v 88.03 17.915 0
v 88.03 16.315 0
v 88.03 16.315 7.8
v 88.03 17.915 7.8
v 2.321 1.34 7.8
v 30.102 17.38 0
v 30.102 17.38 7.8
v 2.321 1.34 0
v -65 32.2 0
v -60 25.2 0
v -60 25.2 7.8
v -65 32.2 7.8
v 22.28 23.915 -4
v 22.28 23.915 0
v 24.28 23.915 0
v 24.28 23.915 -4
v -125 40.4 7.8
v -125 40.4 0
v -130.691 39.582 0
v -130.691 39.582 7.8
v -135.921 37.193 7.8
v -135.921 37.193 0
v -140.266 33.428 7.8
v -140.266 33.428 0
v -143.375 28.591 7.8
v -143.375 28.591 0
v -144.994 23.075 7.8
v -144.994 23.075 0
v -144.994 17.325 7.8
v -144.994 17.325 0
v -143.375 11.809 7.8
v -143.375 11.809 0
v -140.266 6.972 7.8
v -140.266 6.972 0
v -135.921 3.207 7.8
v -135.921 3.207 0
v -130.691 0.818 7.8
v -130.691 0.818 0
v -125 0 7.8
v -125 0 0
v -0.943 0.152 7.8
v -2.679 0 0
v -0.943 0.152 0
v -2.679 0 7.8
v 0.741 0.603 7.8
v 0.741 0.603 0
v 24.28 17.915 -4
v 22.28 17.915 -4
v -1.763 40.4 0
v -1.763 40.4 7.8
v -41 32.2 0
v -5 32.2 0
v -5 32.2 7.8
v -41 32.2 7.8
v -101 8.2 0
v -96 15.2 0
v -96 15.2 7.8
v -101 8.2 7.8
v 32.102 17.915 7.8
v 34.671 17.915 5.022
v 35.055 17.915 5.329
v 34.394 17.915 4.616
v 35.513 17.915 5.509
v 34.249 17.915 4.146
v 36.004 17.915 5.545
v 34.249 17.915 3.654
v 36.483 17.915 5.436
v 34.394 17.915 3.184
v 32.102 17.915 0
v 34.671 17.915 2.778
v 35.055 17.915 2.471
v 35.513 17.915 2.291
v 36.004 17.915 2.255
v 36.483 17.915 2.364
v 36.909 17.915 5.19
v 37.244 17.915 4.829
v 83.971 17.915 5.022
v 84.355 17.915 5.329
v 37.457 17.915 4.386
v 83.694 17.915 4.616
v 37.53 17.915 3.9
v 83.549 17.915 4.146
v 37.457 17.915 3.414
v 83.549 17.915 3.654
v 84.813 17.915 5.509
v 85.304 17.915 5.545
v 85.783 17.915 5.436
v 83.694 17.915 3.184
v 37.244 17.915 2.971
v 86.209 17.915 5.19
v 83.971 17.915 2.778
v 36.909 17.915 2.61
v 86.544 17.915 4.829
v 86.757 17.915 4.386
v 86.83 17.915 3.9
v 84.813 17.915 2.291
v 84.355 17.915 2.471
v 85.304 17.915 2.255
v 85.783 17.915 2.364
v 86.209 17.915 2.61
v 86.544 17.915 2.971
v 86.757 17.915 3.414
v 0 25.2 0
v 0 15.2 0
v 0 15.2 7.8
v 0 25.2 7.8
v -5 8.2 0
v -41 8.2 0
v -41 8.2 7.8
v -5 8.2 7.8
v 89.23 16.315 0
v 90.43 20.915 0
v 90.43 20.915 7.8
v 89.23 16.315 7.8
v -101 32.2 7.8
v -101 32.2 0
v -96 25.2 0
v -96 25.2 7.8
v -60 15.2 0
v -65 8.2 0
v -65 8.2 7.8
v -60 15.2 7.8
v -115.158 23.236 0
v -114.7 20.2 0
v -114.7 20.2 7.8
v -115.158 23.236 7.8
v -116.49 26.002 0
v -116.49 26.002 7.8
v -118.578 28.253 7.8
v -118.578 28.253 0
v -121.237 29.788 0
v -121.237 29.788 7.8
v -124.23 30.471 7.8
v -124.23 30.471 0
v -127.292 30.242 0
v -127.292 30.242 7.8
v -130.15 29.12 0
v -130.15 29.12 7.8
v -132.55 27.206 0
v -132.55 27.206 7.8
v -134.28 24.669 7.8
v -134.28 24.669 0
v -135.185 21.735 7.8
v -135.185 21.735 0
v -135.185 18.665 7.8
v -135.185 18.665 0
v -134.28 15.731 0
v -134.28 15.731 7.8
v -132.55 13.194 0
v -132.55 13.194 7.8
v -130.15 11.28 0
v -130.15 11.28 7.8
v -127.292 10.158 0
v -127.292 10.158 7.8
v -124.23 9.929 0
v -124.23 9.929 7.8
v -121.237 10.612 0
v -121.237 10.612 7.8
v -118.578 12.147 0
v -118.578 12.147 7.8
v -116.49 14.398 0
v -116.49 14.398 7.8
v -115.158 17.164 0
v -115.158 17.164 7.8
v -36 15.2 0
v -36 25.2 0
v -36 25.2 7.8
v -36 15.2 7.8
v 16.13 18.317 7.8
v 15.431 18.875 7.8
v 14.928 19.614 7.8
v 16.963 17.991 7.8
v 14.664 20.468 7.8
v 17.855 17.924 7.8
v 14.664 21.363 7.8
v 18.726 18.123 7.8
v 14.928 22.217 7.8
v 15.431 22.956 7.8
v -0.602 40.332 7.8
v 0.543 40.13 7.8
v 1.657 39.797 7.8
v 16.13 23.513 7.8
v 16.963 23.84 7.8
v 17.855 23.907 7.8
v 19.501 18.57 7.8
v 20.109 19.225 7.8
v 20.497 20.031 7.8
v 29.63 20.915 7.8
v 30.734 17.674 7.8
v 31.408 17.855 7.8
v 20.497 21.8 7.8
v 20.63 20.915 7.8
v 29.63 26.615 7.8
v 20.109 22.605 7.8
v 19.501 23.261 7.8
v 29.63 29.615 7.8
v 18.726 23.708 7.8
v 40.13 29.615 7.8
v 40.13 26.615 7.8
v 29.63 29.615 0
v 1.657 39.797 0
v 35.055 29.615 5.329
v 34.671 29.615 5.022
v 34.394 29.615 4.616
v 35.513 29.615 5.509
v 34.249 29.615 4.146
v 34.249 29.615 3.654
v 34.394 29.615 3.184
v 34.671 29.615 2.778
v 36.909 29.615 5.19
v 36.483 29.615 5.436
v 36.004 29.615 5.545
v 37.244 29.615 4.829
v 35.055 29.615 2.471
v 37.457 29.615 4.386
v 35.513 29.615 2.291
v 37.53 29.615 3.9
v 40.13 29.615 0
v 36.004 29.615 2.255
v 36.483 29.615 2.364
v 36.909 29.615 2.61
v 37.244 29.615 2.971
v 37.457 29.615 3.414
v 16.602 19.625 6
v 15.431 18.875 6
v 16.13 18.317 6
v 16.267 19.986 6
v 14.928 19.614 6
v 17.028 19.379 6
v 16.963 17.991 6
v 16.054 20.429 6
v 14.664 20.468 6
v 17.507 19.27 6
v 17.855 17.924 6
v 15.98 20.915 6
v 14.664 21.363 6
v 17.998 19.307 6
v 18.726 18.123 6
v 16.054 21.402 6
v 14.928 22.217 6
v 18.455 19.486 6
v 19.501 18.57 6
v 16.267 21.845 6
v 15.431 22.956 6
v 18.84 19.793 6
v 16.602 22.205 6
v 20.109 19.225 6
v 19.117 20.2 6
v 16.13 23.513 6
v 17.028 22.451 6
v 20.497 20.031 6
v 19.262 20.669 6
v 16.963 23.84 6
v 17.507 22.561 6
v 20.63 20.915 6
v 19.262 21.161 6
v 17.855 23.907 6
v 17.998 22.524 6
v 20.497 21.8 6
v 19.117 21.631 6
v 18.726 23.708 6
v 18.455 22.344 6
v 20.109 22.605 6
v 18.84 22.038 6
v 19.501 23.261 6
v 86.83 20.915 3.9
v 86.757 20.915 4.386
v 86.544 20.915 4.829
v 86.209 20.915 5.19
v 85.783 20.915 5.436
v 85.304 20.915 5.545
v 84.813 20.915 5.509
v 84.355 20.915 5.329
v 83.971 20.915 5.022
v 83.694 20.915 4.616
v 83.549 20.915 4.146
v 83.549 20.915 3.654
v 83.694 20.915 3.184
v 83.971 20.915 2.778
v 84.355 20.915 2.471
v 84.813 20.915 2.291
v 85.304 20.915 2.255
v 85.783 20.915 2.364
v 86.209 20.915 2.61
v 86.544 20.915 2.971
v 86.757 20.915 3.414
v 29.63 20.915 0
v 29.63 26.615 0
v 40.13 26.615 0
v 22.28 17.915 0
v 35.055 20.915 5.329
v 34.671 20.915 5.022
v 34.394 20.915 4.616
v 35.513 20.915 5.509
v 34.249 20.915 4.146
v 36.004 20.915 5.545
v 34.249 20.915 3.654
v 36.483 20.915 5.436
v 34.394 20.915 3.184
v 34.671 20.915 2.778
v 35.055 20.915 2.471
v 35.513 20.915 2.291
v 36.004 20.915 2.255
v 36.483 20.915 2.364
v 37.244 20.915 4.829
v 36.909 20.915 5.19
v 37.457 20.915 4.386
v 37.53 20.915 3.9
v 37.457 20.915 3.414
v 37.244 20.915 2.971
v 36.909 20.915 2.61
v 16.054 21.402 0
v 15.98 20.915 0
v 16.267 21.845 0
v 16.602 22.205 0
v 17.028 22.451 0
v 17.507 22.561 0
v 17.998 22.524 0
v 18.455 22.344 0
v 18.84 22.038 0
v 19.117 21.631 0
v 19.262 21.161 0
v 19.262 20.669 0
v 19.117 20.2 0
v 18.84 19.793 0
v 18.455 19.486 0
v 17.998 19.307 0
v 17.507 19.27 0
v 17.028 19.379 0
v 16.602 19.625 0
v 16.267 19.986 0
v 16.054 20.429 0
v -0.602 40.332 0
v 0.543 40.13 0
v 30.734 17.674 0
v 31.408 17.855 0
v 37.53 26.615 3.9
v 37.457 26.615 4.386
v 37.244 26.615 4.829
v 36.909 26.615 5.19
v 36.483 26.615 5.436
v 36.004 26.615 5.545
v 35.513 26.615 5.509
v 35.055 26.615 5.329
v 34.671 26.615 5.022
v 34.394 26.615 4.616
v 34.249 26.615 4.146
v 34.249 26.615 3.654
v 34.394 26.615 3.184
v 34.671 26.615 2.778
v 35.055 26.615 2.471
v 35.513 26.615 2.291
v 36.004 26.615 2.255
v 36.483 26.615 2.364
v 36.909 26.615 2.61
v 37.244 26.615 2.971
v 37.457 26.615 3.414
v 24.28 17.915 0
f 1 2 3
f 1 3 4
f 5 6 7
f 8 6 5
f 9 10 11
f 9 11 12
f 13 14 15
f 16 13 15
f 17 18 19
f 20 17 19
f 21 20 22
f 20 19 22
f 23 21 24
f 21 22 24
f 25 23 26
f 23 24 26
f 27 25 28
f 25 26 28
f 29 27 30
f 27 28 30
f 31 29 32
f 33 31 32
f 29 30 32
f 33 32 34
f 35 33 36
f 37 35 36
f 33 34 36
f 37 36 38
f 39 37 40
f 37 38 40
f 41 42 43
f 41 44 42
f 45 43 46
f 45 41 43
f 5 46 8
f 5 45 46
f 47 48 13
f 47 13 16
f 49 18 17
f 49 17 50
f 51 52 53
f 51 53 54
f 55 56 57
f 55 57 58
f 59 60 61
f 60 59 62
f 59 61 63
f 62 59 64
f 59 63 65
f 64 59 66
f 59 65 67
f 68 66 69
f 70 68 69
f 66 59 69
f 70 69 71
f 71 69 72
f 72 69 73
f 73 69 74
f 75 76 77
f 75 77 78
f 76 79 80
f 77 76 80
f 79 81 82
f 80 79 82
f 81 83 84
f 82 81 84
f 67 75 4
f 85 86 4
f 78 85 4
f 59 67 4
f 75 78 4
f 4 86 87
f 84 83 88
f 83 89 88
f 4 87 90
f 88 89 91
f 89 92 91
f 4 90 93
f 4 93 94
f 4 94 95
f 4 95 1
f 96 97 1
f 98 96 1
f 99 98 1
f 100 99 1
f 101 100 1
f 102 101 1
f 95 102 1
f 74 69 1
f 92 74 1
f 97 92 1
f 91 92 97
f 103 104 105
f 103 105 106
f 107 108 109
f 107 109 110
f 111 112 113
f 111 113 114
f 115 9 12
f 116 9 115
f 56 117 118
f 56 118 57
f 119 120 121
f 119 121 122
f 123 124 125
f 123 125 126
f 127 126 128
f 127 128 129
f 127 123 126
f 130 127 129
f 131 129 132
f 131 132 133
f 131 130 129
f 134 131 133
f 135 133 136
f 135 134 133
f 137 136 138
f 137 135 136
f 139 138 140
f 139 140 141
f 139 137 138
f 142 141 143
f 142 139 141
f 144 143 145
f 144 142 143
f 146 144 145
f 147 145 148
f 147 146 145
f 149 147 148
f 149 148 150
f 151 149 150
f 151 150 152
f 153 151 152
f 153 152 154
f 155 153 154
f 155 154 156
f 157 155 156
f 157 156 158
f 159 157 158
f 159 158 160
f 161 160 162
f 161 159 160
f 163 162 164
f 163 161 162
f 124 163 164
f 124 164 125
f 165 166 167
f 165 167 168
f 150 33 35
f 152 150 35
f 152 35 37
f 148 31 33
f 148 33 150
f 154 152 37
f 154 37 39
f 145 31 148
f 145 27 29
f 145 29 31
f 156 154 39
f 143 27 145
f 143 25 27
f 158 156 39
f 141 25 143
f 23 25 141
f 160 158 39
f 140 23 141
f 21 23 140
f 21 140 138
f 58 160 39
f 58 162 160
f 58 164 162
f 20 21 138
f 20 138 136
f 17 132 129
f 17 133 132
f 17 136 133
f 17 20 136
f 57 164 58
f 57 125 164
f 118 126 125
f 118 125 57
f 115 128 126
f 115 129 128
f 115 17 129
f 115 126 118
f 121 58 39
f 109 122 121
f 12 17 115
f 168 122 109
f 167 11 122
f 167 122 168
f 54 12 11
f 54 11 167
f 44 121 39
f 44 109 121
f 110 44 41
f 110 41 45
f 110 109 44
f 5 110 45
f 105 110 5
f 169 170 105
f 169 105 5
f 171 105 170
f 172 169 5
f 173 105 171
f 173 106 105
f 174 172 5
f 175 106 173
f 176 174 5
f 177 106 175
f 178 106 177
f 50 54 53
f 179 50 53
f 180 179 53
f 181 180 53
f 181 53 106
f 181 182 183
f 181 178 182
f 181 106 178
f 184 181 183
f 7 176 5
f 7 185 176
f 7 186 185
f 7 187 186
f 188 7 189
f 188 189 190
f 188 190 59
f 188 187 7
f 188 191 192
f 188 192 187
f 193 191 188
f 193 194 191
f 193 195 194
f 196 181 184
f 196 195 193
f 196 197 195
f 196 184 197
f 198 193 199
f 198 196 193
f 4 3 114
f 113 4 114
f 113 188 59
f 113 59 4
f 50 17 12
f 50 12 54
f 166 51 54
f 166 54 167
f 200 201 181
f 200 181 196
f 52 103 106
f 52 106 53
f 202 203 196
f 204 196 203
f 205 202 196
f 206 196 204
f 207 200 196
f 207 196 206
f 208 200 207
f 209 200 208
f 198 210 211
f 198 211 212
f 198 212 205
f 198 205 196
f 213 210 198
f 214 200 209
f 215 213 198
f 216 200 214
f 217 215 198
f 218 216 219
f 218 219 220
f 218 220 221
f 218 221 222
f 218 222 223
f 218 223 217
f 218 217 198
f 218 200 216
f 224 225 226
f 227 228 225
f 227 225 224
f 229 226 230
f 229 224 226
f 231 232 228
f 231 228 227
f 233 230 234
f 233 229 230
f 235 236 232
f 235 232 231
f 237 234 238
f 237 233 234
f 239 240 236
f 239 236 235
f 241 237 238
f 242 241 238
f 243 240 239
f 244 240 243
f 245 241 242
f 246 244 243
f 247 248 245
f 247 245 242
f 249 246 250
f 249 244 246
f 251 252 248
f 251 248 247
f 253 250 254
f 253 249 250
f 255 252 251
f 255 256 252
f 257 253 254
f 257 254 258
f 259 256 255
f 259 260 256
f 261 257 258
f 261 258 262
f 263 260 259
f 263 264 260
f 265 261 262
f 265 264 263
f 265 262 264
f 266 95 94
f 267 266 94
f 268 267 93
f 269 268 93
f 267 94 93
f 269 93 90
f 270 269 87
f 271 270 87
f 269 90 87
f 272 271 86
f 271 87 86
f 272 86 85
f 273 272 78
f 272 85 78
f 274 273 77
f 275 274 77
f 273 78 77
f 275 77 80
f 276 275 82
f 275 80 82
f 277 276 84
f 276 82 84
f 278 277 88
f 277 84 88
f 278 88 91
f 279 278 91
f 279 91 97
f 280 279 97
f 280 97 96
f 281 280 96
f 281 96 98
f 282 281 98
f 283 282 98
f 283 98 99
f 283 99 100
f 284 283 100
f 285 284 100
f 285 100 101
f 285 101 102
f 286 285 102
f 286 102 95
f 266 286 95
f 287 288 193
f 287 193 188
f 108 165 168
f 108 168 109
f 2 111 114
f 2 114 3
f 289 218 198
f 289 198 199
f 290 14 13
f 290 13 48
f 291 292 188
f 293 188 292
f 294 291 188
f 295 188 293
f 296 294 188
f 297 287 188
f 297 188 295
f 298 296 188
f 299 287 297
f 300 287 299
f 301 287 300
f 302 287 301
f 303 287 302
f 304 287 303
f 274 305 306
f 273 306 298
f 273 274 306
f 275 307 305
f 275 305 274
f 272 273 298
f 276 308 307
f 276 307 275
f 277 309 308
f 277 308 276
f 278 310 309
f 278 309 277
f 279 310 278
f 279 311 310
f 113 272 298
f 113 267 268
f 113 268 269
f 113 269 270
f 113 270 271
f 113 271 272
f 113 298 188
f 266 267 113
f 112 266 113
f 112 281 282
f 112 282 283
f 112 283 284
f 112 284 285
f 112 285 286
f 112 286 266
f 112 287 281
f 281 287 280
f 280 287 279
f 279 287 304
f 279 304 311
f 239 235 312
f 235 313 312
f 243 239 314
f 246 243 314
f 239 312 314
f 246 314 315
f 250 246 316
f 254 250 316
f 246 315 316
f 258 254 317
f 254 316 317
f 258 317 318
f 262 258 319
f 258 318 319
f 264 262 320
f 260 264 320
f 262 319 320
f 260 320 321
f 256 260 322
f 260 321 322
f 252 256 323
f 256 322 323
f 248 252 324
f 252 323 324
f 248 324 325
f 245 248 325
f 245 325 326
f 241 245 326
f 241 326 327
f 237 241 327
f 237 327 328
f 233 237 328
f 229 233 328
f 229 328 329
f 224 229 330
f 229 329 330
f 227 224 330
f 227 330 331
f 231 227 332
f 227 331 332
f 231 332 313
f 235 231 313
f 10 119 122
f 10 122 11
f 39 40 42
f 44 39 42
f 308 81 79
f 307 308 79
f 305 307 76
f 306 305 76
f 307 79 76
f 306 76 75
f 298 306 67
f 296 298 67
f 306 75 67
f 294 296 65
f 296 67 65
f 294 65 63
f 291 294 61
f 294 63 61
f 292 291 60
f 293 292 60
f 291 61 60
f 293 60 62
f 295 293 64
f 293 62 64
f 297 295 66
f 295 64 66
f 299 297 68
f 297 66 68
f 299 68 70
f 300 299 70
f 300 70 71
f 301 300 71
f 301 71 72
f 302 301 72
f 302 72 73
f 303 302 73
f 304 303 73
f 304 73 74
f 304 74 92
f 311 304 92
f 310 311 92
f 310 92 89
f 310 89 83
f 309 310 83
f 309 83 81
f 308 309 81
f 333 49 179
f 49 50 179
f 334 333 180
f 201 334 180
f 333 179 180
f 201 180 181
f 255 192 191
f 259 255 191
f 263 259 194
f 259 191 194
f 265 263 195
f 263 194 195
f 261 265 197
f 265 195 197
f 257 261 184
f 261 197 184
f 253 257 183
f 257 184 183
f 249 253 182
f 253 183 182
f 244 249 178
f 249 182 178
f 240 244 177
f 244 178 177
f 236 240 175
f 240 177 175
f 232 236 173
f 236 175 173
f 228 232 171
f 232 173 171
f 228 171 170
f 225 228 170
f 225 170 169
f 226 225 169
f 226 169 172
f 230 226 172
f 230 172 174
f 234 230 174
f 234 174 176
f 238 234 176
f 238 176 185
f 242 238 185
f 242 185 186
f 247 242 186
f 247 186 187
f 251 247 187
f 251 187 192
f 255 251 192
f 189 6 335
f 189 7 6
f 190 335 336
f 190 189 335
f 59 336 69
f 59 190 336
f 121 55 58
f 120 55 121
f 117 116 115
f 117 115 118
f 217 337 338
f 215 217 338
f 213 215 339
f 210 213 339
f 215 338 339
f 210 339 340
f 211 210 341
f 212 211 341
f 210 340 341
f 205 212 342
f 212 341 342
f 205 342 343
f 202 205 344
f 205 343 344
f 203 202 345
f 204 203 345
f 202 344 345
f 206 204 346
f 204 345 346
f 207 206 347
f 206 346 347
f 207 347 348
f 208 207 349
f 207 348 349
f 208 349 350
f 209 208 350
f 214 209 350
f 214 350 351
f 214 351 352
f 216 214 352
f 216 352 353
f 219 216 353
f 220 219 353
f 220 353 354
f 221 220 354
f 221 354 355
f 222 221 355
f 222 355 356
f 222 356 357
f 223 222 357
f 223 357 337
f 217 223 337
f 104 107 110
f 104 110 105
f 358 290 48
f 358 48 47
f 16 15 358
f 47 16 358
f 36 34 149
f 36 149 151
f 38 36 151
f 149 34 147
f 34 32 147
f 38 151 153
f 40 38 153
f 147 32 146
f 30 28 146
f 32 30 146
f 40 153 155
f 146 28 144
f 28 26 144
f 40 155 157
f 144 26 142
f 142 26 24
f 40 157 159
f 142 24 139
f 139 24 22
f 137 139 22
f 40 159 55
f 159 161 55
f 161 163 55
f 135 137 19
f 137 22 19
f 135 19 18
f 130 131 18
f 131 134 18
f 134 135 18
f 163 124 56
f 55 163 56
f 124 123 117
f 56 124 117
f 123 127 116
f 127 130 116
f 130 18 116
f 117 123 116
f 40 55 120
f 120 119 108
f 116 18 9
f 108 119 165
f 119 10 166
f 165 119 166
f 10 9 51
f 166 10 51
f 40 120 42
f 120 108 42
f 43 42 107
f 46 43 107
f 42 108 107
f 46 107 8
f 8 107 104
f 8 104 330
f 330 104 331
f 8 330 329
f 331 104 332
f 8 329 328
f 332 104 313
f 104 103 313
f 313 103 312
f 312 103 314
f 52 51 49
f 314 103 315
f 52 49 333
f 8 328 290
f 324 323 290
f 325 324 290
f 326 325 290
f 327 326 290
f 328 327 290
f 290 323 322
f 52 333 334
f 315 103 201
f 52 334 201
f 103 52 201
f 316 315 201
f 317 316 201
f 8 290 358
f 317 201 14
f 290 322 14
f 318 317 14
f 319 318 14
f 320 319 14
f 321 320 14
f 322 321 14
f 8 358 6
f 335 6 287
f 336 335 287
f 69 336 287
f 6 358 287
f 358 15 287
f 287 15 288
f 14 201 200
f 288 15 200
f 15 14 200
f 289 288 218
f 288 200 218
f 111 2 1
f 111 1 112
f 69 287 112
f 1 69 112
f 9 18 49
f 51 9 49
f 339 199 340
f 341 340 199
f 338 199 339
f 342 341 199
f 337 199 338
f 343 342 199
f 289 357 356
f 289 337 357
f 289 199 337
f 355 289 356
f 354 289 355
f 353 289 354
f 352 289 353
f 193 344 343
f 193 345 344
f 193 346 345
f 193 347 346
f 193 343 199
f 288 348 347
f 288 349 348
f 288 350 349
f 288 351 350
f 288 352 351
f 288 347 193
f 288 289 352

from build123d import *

# Parameters (mm, degrees)
SKETCH_R            = 10.3
PAD_DEPTH           = 7.8
SKETCH001_R         = 1.65
HOLE_DEPTH          = 22.485586
FILLET_R            = 10
FILLET001_R         = 4
HOLE001_D           = 3.3
HOLE001_CBORE_D     = 6
HOLE001_CBORE_DEPTH = 1.8
SKETCH003_W         = 2
SKETCH003_H         = 6
PAD001_DEPTH        = 4


with BuildPart() as part:
    # Sketch → Pad (new body)
    with BuildSketch(Plane.XY):
        with BuildLine():
            ThreePointArc((-125, 40.4), (-145.2, 20.2), (-125, 0))
            Line((-125, 0), (0, 0))
            Line((31.030407, 17.915414), (0, 0))
            Line((31.030407, 17.915414), (88.030407, 17.915414))
            Line((88.030407, 16.315414), (88.030407, 17.915414))
            Line((89.230407, 16.315414), (88.030407, 16.315414))
            Line((90.430407, 20.915414), (89.230407, 16.315414))
            Line((88.030407, 20.915414), (90.430407, 20.915414))
            Line((31.030407, 20.915414), (88.030407, 20.915414))
            Line((29.630407, 20.915414), (31.030407, 20.915414))
            Line((29.630407, 26.615414), (29.630407, 20.915414))
            Line((40.130407, 26.615414), (29.630407, 26.615414))
            Line((40.130407, 29.615414), (40.130407, 26.615414))
            Line((29.630407, 29.615414), (40.130407, 29.615414))
            Line((0, 40.4), (29.630407, 29.615414))
            Line((-125, 40.4), (0, 40.4))
        make_face()
        with Locations((-125, 20.2)):
            Circle(SKETCH_R, mode=Mode.SUBTRACT)
        Polygon((-101, 32.2), (-96, 25.2), (-96, 15.2), (-101, 8.2), (-65, 8.2), (-60, 15.2), (-60, 25.2), (-65, 32.2), align=None, mode=Mode.SUBTRACT)
        Polygon((-41, 32.2), (-36, 25.2), (-36, 15.2), (-41, 8.2), (-5, 8.2), (0, 15.2), (0, 25.2), (-5, 32.2), align=None, mode=Mode.SUBTRACT)
    extrude(amount=PAD_DEPTH)

    # Sketch001 (on Face5 of Pad) → Hole (cut, through all)
    with BuildSketch(Plane.XZ.offset(-17.915414)):
        with Locations((85.180407, 3.9)):
            Circle(SKETCH001_R)
        with Locations((35.880407, 3.9)):
            Circle(SKETCH001_R)
    extrude(amount=-HOLE_DEPTH, mode=Mode.SUBTRACT)

    # Fillet
    fillet_edges = [part.edges().sort_by_distance(p)[0] for p in [
        (0, 0, 3.9),
        (0, 40.4, 3.9),
    ]]
    fillet(fillet_edges, radius=FILLET_R)

    # Fillet001
    fillet001_edges = [part.edges().sort_by_distance(p)[0] for p in [
        (31.030407, 17.915414, 3.9),
    ]]
    fillet(fillet001_edges, radius=FILLET001_R)

    # Hole001 (through all)
    with Locations(Plane.XY.offset(7.8)):
        with Locations((17.630407, 20.915414)):
            CounterBoreHole(HOLE001_D / 2, HOLE001_CBORE_D / 2, HOLE001_CBORE_DEPTH)

    # Sketch003 (on Face1 of Hole001) → Pad001 (join)
    with BuildSketch(Plane(origin=(0, 0, 0), x_dir=(1, 0, 0), z_dir=(0, 0, -1))):
        with Locations((23.280407, -20.915414)):
            Rectangle(SKETCH003_W, SKETCH003_H)
    extrude(amount=PAD001_DEPTH)


solid = part.part
